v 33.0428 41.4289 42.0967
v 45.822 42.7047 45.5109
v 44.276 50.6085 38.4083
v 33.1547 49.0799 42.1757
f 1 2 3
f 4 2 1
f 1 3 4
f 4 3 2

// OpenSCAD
// Auto-generated auxetic polyhedron
points = [
    [44.276002, 50.608505, 38.408264],
    [45.822009, 42.704741, 45.510869],
    [33.042826, 41.428916, 42.096686],
    [33.154745, 49.079911, 42.175693],
];

faces = [
    [0, 1, 2],
    [2, 1, 3],
    [3, 0, 2],
    [1, 0, 3],
];

polyhedron(points = points, faces = faces);
